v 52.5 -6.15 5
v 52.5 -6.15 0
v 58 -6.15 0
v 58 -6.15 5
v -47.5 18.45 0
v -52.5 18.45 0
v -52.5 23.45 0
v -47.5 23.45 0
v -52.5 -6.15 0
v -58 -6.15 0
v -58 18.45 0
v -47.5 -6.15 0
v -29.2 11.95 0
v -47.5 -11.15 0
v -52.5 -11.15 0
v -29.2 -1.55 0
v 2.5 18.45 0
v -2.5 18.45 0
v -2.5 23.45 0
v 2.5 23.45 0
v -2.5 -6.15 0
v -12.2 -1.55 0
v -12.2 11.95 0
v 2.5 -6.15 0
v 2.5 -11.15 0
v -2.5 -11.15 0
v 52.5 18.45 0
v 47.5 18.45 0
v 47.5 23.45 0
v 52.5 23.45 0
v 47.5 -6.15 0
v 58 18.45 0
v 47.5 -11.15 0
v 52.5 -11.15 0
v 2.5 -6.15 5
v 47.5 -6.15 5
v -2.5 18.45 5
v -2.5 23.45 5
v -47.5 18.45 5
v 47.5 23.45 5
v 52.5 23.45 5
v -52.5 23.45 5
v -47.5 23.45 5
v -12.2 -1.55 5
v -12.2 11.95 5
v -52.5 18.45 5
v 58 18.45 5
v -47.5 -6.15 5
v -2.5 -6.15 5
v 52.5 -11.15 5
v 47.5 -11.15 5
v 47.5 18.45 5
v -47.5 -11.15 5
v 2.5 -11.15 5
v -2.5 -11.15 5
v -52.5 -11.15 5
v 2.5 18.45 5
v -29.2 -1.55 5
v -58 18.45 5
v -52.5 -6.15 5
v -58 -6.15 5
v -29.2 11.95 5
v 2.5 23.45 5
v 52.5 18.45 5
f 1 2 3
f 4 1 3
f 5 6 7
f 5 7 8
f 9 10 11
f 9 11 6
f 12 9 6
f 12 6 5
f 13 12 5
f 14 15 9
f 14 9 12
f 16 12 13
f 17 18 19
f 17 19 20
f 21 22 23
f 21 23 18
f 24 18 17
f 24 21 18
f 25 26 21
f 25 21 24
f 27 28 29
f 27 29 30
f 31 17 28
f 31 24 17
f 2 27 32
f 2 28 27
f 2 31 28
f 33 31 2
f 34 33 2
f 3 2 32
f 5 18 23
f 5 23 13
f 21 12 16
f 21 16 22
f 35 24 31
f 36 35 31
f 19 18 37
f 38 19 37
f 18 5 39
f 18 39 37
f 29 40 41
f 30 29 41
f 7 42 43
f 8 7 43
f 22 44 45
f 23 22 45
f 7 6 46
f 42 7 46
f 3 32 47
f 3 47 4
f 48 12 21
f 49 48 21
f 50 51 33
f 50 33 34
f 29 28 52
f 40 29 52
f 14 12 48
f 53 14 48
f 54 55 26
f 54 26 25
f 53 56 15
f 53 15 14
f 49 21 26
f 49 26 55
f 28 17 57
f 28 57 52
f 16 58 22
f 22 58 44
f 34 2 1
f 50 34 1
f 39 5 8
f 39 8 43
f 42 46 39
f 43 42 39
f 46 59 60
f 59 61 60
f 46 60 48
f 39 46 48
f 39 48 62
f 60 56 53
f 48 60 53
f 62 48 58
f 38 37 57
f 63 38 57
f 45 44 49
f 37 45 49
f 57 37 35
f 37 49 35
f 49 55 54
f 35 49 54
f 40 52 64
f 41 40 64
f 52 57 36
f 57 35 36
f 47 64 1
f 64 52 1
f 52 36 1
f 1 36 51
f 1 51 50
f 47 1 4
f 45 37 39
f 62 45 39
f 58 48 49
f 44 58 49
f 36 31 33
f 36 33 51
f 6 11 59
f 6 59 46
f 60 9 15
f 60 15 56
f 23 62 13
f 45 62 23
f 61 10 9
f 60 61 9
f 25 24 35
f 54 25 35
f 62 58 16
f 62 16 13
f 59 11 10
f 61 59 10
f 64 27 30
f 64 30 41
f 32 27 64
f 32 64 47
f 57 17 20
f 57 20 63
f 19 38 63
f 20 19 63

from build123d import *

# Parameters (mm, degrees)
SKETCH1_W           = 116
SKETCH1_H           = 12.3
BOSS_EXTRUDE1_DEPTH = 5
SKETCH2_W           = 5
SKETCH2_H           = 5
BOSS_EXTRUDE2_DEPTH = 5
SKETCH3_W           = 17
SKETCH3_H           = 13.5
CUT_EXTRUDE1_DEPTH  = 6


with BuildPart() as part:
    # Sketch1 → Boss-Extrude1 (new body)
    with BuildSketch(Plane.XY):
        Rectangle(SKETCH1_W, SKETCH1_H)
    extrude(amount=BOSS_EXTRUDE1_DEPTH)

    # Sketch2 → Boss-Extrude2 (add)
    with BuildSketch(Plane.XZ.offset(6.15)):
        with Locations((-50, 2.5)):
            Rectangle(SKETCH2_W, SKETCH2_H)
        with Locations((0, 2.5)):
            Rectangle(SKETCH2_W, SKETCH2_H)
        with Locations((50, 2.5)):
            Rectangle(SKETCH2_W, SKETCH2_H)
    extrude(amount=BOSS_EXTRUDE2_DEPTH)

    # Mirror1: part across plane


with BuildPart() as part_1:
    add(part.part)
    add(part.part.mirror(Plane(origin=(-58, 6.15, 5), x_dir=(0, 0, 1), z_dir=(0, -1, 0))))

    # Sketch3 → Cut-Extrude1 (cut, through all)
    with BuildSketch(Plane.XY.offset(5)):
        with Locations((-20.7, 5.2)):
            Rectangle(SKETCH3_W, SKETCH3_H)
    extrude(amount=-CUT_EXTRUDE1_DEPTH, mode=Mode.SUBTRACT)


solid = part_1.part
